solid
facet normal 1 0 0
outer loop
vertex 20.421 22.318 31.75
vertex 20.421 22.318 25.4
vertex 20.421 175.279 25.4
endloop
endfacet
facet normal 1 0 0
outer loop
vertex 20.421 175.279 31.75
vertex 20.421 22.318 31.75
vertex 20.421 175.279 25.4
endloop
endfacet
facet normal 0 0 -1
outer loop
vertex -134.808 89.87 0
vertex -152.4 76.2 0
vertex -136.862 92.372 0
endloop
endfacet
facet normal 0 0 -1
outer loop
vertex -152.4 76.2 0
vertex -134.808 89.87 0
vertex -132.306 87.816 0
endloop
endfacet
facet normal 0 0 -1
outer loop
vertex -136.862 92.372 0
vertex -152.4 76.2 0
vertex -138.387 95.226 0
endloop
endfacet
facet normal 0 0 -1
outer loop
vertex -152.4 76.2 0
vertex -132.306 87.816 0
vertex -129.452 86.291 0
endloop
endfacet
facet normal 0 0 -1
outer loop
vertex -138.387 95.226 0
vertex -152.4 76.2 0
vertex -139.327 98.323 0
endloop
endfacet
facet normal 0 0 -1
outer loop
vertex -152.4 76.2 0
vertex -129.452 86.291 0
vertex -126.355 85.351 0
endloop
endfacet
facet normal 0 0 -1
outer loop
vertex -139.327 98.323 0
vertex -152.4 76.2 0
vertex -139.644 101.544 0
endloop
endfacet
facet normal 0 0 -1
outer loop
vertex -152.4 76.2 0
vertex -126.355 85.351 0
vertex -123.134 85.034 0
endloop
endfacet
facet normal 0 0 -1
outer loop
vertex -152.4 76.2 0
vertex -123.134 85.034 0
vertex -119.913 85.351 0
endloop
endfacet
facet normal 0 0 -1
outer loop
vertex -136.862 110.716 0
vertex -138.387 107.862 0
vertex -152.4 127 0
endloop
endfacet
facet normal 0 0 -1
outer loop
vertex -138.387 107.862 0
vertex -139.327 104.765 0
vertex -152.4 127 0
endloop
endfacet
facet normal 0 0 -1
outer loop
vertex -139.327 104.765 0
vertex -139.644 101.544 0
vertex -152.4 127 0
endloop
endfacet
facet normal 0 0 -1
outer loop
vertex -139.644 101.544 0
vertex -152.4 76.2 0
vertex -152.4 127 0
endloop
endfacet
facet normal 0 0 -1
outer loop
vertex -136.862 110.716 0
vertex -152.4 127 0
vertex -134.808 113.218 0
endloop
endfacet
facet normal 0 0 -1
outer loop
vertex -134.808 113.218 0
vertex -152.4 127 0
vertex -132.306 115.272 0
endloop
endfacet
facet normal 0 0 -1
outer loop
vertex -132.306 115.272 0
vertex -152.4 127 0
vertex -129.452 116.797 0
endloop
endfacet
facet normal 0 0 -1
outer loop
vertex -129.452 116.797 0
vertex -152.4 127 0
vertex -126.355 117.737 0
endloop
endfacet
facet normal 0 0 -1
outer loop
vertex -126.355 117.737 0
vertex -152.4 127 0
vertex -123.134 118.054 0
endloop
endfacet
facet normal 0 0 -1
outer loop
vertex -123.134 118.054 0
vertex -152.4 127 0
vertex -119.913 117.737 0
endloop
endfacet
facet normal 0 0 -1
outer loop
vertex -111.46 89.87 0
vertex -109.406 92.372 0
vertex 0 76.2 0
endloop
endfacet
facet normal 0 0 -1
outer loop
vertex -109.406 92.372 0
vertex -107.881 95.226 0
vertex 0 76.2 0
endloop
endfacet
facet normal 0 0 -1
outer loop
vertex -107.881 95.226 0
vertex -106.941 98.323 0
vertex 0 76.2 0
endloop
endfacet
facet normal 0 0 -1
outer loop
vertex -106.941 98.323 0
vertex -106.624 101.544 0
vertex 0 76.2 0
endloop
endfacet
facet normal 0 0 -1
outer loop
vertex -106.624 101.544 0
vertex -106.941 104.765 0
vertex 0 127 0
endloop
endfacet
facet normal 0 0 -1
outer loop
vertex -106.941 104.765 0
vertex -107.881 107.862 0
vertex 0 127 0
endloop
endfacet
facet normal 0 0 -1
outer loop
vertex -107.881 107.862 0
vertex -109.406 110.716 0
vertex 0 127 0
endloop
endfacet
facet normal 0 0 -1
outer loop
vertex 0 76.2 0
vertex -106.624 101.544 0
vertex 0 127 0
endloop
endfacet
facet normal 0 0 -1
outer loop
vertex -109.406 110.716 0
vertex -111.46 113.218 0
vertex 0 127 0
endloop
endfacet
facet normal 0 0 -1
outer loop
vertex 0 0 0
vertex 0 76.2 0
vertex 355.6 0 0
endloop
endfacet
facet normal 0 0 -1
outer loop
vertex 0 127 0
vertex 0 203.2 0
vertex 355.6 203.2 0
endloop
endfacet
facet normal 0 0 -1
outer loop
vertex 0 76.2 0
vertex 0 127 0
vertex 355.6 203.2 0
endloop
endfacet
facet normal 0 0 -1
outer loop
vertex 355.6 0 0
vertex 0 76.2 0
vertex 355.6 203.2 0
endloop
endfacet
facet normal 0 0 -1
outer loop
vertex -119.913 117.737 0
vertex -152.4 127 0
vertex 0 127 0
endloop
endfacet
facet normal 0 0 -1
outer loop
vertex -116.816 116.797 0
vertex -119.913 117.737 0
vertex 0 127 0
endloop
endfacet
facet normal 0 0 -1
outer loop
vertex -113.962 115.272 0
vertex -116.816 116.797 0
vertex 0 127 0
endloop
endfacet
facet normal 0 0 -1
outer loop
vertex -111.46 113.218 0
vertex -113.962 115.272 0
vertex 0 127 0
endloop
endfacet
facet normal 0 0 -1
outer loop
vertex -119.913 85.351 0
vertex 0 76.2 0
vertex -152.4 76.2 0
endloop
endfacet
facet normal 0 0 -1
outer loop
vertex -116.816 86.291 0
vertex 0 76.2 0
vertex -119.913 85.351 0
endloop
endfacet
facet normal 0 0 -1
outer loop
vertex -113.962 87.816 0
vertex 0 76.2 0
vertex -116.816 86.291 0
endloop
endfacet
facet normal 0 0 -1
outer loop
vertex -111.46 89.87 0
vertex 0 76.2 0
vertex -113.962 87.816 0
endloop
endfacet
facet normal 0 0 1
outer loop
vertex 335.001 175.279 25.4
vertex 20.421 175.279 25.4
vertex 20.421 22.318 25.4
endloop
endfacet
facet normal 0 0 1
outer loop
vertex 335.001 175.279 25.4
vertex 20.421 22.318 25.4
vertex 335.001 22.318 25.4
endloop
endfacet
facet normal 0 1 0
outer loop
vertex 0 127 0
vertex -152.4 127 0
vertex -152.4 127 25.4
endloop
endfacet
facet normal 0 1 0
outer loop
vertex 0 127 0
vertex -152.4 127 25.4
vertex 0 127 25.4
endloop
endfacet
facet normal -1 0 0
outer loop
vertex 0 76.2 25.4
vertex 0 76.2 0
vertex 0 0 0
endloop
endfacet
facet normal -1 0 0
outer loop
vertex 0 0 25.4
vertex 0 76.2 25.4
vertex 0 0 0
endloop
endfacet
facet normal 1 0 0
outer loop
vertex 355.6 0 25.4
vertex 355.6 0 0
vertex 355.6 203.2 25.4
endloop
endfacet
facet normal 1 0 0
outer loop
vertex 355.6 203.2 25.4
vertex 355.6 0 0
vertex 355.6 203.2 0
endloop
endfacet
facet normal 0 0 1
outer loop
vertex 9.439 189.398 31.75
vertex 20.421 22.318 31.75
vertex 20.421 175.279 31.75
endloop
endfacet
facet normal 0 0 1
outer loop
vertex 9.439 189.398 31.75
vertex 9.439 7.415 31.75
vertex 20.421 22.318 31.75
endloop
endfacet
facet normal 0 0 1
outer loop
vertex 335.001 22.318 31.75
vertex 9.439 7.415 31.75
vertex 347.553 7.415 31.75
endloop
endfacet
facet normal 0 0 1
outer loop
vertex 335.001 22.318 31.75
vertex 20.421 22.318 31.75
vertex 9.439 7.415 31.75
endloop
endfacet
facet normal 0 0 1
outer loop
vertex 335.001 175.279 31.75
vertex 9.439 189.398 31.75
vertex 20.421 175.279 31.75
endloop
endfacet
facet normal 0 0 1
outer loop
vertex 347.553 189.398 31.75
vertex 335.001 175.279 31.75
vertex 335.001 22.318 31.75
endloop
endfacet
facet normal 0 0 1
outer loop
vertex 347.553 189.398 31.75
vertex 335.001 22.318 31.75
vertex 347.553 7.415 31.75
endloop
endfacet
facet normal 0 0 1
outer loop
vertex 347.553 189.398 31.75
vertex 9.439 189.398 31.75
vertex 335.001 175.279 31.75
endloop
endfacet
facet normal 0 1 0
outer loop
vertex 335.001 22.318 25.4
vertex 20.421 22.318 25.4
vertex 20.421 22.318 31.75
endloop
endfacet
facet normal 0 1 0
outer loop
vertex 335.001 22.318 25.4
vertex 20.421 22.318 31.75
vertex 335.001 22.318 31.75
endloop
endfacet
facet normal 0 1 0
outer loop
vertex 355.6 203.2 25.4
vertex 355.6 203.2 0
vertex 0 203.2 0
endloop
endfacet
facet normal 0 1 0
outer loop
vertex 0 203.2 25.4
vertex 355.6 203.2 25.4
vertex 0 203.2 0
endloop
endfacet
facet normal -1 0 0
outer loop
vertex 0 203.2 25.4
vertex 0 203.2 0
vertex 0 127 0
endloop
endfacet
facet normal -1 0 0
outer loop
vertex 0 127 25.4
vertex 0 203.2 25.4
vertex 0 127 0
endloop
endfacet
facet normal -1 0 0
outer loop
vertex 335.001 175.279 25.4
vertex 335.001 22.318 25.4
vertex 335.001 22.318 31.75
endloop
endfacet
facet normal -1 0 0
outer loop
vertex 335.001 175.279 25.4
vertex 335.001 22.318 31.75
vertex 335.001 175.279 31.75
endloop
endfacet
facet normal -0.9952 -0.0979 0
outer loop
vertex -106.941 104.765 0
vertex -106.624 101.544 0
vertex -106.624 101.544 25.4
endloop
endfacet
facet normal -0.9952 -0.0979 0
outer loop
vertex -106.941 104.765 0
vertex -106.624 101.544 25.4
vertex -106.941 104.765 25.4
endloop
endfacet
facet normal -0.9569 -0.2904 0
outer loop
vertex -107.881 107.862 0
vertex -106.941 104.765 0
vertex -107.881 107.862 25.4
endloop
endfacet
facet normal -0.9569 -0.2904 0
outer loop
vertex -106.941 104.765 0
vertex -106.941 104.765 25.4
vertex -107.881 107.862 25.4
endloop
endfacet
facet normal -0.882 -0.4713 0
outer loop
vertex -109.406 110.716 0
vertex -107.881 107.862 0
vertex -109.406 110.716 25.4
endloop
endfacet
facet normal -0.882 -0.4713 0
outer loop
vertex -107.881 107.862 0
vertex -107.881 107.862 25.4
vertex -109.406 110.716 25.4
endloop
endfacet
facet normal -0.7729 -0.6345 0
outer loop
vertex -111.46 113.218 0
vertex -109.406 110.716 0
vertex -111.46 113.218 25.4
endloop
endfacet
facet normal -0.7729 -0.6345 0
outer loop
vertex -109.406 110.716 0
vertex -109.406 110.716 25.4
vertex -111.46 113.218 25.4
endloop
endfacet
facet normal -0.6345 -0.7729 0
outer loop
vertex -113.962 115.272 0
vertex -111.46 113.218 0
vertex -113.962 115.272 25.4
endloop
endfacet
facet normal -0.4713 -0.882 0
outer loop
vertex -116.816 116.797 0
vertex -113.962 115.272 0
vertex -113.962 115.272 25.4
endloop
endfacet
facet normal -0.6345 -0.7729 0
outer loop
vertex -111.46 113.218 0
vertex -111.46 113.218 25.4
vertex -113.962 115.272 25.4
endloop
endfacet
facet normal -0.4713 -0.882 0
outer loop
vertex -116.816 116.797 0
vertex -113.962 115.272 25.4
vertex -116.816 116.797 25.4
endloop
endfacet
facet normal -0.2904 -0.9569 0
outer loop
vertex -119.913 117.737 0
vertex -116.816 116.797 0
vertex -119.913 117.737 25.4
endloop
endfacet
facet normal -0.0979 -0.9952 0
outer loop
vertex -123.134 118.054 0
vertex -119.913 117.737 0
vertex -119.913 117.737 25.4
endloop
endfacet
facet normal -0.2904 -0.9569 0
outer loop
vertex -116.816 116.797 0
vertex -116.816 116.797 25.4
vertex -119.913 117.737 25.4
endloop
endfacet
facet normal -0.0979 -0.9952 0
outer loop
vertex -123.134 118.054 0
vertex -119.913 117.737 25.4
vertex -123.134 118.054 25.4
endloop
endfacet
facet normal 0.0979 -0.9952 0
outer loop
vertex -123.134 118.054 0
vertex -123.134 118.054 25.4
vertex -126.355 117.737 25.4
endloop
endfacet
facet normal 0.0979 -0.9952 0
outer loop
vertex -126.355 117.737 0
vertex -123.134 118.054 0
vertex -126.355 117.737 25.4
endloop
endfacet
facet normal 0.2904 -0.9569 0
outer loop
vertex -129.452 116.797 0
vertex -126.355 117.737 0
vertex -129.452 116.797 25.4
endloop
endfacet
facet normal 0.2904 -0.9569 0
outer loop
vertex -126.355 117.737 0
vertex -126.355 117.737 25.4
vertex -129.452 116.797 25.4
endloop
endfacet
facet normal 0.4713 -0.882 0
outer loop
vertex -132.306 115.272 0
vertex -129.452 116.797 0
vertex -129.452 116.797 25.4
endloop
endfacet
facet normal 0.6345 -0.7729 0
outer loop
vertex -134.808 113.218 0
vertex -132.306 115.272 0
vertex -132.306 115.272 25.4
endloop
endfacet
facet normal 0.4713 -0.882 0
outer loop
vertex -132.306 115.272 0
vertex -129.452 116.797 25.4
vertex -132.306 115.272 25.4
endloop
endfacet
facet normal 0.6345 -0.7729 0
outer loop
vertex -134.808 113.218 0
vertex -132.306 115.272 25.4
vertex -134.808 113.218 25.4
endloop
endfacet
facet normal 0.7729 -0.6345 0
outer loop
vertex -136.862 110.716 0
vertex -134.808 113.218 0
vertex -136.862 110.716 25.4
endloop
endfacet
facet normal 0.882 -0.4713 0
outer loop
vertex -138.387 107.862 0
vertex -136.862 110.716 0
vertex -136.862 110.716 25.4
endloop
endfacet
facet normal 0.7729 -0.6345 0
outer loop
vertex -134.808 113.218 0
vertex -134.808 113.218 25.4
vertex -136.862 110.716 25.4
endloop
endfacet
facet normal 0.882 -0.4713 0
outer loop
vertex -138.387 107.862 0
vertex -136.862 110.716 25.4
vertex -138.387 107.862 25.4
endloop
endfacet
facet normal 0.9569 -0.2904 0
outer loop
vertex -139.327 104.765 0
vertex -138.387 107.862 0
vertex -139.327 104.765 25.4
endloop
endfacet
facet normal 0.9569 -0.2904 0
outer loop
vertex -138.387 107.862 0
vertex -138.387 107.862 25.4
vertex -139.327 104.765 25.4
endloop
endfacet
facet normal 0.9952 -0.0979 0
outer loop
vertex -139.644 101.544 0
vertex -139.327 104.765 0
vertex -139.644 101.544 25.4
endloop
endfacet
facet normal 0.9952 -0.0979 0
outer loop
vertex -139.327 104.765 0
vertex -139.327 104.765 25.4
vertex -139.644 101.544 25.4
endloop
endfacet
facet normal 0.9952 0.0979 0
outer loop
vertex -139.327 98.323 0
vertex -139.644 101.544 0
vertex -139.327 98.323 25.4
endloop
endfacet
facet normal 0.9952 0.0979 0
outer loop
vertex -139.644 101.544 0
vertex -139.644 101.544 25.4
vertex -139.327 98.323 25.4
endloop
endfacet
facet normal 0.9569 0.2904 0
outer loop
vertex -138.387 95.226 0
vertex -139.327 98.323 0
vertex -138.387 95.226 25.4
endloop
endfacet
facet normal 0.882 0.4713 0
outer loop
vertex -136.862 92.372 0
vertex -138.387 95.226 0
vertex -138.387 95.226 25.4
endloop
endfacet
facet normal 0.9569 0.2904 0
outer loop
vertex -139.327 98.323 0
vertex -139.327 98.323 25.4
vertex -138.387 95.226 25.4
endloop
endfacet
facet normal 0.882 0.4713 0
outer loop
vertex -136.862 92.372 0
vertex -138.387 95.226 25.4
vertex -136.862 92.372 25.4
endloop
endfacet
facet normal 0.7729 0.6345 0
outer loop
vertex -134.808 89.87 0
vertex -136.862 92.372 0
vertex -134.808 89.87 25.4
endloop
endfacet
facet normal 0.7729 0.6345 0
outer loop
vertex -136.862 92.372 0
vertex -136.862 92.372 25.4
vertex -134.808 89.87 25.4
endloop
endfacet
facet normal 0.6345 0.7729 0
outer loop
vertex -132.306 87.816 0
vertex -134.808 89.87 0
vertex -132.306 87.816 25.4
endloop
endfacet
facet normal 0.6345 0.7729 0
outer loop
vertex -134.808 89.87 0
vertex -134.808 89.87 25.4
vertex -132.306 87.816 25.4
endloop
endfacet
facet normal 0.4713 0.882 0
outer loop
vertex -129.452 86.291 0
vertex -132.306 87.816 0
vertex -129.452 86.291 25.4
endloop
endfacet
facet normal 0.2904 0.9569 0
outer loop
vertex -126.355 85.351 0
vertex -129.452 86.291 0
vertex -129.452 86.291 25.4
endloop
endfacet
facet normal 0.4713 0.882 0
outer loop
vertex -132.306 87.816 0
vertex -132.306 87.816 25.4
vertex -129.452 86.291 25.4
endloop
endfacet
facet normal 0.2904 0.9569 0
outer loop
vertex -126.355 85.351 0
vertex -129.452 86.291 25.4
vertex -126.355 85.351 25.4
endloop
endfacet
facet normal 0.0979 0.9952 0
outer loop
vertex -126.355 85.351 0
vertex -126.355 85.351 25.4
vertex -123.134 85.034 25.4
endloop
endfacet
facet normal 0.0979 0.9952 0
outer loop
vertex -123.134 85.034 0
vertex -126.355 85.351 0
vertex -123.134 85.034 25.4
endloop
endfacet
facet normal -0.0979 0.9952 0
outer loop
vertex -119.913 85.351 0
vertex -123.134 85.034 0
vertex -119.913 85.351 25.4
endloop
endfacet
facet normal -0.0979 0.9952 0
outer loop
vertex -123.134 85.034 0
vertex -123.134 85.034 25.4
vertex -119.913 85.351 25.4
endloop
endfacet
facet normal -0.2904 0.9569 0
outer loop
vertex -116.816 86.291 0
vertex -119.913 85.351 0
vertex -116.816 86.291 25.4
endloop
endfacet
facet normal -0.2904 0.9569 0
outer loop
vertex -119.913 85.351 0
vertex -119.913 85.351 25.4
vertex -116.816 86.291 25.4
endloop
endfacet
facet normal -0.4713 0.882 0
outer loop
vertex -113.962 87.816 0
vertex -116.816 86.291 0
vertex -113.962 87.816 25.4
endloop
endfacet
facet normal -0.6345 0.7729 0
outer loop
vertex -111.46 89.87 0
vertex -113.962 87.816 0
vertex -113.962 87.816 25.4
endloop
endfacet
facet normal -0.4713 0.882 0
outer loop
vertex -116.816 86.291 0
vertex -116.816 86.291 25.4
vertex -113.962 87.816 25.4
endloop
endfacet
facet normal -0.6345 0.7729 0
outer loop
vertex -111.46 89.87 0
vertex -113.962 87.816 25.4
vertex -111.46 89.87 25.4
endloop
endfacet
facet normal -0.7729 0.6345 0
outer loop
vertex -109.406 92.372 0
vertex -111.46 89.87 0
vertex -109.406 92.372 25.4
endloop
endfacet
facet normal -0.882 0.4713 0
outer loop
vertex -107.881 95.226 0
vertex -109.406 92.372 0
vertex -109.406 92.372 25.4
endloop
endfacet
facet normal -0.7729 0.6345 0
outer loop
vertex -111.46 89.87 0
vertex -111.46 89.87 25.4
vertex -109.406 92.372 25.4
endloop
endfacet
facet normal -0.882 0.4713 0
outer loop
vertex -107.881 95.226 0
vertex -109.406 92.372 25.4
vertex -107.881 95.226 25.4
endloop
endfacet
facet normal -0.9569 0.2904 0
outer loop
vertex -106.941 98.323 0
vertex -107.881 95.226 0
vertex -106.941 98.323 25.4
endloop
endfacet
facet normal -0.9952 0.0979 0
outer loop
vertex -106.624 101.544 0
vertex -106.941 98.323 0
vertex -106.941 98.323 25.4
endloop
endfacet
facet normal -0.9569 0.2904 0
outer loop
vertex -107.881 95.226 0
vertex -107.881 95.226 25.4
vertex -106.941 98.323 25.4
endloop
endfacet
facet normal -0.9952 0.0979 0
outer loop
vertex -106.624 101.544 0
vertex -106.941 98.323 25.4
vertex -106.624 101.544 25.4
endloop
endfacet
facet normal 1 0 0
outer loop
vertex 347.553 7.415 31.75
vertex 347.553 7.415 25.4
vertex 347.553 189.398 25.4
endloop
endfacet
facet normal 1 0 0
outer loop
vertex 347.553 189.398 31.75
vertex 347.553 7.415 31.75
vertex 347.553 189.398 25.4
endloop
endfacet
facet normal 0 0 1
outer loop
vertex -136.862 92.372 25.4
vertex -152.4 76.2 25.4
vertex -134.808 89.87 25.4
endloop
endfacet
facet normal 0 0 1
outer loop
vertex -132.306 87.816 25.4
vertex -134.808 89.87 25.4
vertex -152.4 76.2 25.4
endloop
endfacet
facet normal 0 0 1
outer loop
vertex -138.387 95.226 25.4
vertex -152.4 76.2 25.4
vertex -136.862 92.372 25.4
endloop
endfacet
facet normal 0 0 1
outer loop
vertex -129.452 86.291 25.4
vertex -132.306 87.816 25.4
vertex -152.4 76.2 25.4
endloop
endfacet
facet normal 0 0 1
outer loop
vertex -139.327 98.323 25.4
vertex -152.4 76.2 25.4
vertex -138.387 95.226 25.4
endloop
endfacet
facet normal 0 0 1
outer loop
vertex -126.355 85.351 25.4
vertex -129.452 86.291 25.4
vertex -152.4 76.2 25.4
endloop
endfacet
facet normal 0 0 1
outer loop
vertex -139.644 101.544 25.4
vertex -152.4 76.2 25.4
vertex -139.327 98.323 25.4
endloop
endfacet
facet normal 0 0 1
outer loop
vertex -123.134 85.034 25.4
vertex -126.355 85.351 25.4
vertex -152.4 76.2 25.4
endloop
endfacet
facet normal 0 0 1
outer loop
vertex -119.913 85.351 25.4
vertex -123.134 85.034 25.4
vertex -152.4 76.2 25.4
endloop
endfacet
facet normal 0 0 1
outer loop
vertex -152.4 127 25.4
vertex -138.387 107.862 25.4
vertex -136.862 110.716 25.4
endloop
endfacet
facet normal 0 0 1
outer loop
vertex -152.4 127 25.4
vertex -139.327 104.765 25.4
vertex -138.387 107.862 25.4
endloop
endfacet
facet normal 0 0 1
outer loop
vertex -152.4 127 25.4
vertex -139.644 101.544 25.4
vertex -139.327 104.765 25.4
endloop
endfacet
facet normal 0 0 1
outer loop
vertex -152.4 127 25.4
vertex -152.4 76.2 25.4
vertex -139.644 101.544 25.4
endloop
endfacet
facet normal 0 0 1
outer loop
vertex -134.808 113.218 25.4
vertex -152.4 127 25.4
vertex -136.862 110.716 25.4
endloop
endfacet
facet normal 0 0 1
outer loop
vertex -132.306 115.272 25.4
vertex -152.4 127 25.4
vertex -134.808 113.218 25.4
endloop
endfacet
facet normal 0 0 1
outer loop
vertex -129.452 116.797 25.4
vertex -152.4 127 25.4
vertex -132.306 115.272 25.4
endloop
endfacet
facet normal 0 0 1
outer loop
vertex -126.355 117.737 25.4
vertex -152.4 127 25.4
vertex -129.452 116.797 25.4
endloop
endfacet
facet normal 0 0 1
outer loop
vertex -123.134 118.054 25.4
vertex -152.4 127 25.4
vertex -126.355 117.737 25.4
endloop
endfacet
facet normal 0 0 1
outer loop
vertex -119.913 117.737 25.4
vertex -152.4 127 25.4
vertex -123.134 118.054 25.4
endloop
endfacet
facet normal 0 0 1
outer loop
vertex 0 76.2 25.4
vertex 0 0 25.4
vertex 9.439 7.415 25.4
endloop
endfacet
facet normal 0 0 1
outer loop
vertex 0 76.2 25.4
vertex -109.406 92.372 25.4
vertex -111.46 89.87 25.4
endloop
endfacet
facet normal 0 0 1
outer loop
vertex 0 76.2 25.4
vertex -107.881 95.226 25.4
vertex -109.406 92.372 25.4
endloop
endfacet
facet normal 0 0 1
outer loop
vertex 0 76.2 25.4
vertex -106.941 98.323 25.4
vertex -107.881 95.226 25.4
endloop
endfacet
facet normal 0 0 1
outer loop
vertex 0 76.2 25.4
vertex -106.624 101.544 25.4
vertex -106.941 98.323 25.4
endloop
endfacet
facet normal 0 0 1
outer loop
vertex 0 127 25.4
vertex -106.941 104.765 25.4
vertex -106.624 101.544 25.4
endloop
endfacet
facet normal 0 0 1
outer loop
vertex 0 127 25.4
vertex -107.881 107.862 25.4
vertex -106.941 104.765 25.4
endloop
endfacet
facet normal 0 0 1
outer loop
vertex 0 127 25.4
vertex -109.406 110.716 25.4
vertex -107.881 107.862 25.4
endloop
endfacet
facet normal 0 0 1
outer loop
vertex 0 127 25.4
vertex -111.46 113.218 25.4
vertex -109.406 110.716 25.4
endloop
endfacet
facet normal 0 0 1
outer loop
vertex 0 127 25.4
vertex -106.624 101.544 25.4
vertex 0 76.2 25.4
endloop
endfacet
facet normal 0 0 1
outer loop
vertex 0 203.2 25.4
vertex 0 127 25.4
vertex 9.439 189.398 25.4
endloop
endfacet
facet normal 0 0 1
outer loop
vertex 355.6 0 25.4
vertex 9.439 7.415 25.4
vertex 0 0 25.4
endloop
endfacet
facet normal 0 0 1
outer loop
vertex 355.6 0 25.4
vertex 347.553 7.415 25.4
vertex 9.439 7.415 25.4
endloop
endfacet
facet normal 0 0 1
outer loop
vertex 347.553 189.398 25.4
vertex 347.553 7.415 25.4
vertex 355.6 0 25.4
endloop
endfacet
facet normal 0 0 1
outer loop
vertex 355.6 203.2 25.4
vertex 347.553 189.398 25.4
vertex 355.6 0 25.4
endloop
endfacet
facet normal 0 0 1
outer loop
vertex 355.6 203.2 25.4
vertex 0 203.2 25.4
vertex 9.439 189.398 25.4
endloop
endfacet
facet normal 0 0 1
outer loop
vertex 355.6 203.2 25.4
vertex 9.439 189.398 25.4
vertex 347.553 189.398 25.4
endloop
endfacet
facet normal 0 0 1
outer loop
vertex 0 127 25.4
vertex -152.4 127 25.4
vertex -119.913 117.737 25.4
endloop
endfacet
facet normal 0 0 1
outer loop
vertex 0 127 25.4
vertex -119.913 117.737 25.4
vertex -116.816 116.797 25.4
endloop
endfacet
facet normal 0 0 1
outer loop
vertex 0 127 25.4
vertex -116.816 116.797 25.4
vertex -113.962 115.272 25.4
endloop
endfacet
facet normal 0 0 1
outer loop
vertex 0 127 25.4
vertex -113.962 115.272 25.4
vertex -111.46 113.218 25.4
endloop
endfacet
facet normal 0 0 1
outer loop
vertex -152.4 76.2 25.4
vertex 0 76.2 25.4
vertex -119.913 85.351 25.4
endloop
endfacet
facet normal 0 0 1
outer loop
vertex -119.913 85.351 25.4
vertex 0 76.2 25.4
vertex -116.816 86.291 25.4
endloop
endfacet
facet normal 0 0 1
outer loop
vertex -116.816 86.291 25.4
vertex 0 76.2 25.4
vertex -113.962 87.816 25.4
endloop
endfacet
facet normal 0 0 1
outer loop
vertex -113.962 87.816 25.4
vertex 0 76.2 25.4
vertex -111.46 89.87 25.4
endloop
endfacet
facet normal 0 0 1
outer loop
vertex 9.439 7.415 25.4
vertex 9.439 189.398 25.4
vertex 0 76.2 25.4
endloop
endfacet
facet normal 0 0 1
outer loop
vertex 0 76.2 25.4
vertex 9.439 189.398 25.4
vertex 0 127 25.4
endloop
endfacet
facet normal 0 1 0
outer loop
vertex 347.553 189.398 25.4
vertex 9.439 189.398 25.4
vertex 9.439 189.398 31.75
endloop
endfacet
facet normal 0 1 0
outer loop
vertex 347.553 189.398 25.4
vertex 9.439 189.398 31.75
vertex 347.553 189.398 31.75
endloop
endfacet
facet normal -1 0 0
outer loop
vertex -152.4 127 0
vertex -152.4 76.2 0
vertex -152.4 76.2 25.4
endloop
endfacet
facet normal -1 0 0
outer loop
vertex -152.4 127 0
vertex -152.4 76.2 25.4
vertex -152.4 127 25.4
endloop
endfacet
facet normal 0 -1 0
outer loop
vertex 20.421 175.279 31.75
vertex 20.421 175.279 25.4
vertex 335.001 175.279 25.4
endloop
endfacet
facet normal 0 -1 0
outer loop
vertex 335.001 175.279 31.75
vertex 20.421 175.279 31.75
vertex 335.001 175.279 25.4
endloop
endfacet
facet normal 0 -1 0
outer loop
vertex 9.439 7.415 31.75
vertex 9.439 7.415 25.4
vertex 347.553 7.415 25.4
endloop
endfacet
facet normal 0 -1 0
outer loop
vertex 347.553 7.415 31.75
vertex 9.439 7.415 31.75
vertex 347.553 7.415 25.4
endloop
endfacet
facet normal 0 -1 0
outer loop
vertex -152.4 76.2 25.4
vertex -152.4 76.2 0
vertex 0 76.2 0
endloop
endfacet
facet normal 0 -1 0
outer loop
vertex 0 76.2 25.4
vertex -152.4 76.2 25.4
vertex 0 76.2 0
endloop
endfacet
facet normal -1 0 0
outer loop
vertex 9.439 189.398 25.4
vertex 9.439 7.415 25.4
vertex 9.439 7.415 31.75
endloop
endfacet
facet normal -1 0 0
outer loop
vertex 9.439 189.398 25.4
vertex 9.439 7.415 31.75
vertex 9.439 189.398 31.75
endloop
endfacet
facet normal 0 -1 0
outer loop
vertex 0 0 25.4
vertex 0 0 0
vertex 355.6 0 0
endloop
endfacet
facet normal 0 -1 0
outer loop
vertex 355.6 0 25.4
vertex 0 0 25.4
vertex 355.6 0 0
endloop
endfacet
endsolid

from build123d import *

# Parameters (mm, degrees)
F0_W     = 152.4
F0_H     = 50.8
F1_DEPTH = 25.4
F3_W     = 338.114095
F3_H     = 181.983536
F3_W_2   = 314.57949
F3_H_2   = 152.960297
F4_DEPTH = 6.35
F2_R     = 16.51
F5_DEPTH = 25.4


with BuildPart() as f1:
    # F0 (on Top) → F1 (new body)
    with BuildSketch(Plane.XY):
        Polygon((0, 76.2), (0, 0), (355.6, 0), (355.6, 203.2), (0, 203.2), (0, 127), align=None)
        with Locations((-76.2, 101.6)):
            Rectangle(F0_W, F0_H)
    extrude(amount=F1_DEPTH)

    # F3 (on face) → F4 (join)
    with BuildSketch(Plane.XY.offset(25.4)):
        with Locations((178.495669, 98.406327)):
            Rectangle(F3_W, F3_H)
        with Locations((177.711187, 98.79853)):
            Rectangle(F3_W_2, F3_H_2, mode=Mode.SUBTRACT)
    extrude(amount=F4_DEPTH)

    # F2 (on face) → F5 (cut)
    with BuildSketch(Plane.XY.offset(25.4)):
        with Locations((-123.133972, 101.54397)):
            Circle(F2_R)
    extrude(amount=-F5_DEPTH, mode=Mode.SUBTRACT)


solid = f1.part
